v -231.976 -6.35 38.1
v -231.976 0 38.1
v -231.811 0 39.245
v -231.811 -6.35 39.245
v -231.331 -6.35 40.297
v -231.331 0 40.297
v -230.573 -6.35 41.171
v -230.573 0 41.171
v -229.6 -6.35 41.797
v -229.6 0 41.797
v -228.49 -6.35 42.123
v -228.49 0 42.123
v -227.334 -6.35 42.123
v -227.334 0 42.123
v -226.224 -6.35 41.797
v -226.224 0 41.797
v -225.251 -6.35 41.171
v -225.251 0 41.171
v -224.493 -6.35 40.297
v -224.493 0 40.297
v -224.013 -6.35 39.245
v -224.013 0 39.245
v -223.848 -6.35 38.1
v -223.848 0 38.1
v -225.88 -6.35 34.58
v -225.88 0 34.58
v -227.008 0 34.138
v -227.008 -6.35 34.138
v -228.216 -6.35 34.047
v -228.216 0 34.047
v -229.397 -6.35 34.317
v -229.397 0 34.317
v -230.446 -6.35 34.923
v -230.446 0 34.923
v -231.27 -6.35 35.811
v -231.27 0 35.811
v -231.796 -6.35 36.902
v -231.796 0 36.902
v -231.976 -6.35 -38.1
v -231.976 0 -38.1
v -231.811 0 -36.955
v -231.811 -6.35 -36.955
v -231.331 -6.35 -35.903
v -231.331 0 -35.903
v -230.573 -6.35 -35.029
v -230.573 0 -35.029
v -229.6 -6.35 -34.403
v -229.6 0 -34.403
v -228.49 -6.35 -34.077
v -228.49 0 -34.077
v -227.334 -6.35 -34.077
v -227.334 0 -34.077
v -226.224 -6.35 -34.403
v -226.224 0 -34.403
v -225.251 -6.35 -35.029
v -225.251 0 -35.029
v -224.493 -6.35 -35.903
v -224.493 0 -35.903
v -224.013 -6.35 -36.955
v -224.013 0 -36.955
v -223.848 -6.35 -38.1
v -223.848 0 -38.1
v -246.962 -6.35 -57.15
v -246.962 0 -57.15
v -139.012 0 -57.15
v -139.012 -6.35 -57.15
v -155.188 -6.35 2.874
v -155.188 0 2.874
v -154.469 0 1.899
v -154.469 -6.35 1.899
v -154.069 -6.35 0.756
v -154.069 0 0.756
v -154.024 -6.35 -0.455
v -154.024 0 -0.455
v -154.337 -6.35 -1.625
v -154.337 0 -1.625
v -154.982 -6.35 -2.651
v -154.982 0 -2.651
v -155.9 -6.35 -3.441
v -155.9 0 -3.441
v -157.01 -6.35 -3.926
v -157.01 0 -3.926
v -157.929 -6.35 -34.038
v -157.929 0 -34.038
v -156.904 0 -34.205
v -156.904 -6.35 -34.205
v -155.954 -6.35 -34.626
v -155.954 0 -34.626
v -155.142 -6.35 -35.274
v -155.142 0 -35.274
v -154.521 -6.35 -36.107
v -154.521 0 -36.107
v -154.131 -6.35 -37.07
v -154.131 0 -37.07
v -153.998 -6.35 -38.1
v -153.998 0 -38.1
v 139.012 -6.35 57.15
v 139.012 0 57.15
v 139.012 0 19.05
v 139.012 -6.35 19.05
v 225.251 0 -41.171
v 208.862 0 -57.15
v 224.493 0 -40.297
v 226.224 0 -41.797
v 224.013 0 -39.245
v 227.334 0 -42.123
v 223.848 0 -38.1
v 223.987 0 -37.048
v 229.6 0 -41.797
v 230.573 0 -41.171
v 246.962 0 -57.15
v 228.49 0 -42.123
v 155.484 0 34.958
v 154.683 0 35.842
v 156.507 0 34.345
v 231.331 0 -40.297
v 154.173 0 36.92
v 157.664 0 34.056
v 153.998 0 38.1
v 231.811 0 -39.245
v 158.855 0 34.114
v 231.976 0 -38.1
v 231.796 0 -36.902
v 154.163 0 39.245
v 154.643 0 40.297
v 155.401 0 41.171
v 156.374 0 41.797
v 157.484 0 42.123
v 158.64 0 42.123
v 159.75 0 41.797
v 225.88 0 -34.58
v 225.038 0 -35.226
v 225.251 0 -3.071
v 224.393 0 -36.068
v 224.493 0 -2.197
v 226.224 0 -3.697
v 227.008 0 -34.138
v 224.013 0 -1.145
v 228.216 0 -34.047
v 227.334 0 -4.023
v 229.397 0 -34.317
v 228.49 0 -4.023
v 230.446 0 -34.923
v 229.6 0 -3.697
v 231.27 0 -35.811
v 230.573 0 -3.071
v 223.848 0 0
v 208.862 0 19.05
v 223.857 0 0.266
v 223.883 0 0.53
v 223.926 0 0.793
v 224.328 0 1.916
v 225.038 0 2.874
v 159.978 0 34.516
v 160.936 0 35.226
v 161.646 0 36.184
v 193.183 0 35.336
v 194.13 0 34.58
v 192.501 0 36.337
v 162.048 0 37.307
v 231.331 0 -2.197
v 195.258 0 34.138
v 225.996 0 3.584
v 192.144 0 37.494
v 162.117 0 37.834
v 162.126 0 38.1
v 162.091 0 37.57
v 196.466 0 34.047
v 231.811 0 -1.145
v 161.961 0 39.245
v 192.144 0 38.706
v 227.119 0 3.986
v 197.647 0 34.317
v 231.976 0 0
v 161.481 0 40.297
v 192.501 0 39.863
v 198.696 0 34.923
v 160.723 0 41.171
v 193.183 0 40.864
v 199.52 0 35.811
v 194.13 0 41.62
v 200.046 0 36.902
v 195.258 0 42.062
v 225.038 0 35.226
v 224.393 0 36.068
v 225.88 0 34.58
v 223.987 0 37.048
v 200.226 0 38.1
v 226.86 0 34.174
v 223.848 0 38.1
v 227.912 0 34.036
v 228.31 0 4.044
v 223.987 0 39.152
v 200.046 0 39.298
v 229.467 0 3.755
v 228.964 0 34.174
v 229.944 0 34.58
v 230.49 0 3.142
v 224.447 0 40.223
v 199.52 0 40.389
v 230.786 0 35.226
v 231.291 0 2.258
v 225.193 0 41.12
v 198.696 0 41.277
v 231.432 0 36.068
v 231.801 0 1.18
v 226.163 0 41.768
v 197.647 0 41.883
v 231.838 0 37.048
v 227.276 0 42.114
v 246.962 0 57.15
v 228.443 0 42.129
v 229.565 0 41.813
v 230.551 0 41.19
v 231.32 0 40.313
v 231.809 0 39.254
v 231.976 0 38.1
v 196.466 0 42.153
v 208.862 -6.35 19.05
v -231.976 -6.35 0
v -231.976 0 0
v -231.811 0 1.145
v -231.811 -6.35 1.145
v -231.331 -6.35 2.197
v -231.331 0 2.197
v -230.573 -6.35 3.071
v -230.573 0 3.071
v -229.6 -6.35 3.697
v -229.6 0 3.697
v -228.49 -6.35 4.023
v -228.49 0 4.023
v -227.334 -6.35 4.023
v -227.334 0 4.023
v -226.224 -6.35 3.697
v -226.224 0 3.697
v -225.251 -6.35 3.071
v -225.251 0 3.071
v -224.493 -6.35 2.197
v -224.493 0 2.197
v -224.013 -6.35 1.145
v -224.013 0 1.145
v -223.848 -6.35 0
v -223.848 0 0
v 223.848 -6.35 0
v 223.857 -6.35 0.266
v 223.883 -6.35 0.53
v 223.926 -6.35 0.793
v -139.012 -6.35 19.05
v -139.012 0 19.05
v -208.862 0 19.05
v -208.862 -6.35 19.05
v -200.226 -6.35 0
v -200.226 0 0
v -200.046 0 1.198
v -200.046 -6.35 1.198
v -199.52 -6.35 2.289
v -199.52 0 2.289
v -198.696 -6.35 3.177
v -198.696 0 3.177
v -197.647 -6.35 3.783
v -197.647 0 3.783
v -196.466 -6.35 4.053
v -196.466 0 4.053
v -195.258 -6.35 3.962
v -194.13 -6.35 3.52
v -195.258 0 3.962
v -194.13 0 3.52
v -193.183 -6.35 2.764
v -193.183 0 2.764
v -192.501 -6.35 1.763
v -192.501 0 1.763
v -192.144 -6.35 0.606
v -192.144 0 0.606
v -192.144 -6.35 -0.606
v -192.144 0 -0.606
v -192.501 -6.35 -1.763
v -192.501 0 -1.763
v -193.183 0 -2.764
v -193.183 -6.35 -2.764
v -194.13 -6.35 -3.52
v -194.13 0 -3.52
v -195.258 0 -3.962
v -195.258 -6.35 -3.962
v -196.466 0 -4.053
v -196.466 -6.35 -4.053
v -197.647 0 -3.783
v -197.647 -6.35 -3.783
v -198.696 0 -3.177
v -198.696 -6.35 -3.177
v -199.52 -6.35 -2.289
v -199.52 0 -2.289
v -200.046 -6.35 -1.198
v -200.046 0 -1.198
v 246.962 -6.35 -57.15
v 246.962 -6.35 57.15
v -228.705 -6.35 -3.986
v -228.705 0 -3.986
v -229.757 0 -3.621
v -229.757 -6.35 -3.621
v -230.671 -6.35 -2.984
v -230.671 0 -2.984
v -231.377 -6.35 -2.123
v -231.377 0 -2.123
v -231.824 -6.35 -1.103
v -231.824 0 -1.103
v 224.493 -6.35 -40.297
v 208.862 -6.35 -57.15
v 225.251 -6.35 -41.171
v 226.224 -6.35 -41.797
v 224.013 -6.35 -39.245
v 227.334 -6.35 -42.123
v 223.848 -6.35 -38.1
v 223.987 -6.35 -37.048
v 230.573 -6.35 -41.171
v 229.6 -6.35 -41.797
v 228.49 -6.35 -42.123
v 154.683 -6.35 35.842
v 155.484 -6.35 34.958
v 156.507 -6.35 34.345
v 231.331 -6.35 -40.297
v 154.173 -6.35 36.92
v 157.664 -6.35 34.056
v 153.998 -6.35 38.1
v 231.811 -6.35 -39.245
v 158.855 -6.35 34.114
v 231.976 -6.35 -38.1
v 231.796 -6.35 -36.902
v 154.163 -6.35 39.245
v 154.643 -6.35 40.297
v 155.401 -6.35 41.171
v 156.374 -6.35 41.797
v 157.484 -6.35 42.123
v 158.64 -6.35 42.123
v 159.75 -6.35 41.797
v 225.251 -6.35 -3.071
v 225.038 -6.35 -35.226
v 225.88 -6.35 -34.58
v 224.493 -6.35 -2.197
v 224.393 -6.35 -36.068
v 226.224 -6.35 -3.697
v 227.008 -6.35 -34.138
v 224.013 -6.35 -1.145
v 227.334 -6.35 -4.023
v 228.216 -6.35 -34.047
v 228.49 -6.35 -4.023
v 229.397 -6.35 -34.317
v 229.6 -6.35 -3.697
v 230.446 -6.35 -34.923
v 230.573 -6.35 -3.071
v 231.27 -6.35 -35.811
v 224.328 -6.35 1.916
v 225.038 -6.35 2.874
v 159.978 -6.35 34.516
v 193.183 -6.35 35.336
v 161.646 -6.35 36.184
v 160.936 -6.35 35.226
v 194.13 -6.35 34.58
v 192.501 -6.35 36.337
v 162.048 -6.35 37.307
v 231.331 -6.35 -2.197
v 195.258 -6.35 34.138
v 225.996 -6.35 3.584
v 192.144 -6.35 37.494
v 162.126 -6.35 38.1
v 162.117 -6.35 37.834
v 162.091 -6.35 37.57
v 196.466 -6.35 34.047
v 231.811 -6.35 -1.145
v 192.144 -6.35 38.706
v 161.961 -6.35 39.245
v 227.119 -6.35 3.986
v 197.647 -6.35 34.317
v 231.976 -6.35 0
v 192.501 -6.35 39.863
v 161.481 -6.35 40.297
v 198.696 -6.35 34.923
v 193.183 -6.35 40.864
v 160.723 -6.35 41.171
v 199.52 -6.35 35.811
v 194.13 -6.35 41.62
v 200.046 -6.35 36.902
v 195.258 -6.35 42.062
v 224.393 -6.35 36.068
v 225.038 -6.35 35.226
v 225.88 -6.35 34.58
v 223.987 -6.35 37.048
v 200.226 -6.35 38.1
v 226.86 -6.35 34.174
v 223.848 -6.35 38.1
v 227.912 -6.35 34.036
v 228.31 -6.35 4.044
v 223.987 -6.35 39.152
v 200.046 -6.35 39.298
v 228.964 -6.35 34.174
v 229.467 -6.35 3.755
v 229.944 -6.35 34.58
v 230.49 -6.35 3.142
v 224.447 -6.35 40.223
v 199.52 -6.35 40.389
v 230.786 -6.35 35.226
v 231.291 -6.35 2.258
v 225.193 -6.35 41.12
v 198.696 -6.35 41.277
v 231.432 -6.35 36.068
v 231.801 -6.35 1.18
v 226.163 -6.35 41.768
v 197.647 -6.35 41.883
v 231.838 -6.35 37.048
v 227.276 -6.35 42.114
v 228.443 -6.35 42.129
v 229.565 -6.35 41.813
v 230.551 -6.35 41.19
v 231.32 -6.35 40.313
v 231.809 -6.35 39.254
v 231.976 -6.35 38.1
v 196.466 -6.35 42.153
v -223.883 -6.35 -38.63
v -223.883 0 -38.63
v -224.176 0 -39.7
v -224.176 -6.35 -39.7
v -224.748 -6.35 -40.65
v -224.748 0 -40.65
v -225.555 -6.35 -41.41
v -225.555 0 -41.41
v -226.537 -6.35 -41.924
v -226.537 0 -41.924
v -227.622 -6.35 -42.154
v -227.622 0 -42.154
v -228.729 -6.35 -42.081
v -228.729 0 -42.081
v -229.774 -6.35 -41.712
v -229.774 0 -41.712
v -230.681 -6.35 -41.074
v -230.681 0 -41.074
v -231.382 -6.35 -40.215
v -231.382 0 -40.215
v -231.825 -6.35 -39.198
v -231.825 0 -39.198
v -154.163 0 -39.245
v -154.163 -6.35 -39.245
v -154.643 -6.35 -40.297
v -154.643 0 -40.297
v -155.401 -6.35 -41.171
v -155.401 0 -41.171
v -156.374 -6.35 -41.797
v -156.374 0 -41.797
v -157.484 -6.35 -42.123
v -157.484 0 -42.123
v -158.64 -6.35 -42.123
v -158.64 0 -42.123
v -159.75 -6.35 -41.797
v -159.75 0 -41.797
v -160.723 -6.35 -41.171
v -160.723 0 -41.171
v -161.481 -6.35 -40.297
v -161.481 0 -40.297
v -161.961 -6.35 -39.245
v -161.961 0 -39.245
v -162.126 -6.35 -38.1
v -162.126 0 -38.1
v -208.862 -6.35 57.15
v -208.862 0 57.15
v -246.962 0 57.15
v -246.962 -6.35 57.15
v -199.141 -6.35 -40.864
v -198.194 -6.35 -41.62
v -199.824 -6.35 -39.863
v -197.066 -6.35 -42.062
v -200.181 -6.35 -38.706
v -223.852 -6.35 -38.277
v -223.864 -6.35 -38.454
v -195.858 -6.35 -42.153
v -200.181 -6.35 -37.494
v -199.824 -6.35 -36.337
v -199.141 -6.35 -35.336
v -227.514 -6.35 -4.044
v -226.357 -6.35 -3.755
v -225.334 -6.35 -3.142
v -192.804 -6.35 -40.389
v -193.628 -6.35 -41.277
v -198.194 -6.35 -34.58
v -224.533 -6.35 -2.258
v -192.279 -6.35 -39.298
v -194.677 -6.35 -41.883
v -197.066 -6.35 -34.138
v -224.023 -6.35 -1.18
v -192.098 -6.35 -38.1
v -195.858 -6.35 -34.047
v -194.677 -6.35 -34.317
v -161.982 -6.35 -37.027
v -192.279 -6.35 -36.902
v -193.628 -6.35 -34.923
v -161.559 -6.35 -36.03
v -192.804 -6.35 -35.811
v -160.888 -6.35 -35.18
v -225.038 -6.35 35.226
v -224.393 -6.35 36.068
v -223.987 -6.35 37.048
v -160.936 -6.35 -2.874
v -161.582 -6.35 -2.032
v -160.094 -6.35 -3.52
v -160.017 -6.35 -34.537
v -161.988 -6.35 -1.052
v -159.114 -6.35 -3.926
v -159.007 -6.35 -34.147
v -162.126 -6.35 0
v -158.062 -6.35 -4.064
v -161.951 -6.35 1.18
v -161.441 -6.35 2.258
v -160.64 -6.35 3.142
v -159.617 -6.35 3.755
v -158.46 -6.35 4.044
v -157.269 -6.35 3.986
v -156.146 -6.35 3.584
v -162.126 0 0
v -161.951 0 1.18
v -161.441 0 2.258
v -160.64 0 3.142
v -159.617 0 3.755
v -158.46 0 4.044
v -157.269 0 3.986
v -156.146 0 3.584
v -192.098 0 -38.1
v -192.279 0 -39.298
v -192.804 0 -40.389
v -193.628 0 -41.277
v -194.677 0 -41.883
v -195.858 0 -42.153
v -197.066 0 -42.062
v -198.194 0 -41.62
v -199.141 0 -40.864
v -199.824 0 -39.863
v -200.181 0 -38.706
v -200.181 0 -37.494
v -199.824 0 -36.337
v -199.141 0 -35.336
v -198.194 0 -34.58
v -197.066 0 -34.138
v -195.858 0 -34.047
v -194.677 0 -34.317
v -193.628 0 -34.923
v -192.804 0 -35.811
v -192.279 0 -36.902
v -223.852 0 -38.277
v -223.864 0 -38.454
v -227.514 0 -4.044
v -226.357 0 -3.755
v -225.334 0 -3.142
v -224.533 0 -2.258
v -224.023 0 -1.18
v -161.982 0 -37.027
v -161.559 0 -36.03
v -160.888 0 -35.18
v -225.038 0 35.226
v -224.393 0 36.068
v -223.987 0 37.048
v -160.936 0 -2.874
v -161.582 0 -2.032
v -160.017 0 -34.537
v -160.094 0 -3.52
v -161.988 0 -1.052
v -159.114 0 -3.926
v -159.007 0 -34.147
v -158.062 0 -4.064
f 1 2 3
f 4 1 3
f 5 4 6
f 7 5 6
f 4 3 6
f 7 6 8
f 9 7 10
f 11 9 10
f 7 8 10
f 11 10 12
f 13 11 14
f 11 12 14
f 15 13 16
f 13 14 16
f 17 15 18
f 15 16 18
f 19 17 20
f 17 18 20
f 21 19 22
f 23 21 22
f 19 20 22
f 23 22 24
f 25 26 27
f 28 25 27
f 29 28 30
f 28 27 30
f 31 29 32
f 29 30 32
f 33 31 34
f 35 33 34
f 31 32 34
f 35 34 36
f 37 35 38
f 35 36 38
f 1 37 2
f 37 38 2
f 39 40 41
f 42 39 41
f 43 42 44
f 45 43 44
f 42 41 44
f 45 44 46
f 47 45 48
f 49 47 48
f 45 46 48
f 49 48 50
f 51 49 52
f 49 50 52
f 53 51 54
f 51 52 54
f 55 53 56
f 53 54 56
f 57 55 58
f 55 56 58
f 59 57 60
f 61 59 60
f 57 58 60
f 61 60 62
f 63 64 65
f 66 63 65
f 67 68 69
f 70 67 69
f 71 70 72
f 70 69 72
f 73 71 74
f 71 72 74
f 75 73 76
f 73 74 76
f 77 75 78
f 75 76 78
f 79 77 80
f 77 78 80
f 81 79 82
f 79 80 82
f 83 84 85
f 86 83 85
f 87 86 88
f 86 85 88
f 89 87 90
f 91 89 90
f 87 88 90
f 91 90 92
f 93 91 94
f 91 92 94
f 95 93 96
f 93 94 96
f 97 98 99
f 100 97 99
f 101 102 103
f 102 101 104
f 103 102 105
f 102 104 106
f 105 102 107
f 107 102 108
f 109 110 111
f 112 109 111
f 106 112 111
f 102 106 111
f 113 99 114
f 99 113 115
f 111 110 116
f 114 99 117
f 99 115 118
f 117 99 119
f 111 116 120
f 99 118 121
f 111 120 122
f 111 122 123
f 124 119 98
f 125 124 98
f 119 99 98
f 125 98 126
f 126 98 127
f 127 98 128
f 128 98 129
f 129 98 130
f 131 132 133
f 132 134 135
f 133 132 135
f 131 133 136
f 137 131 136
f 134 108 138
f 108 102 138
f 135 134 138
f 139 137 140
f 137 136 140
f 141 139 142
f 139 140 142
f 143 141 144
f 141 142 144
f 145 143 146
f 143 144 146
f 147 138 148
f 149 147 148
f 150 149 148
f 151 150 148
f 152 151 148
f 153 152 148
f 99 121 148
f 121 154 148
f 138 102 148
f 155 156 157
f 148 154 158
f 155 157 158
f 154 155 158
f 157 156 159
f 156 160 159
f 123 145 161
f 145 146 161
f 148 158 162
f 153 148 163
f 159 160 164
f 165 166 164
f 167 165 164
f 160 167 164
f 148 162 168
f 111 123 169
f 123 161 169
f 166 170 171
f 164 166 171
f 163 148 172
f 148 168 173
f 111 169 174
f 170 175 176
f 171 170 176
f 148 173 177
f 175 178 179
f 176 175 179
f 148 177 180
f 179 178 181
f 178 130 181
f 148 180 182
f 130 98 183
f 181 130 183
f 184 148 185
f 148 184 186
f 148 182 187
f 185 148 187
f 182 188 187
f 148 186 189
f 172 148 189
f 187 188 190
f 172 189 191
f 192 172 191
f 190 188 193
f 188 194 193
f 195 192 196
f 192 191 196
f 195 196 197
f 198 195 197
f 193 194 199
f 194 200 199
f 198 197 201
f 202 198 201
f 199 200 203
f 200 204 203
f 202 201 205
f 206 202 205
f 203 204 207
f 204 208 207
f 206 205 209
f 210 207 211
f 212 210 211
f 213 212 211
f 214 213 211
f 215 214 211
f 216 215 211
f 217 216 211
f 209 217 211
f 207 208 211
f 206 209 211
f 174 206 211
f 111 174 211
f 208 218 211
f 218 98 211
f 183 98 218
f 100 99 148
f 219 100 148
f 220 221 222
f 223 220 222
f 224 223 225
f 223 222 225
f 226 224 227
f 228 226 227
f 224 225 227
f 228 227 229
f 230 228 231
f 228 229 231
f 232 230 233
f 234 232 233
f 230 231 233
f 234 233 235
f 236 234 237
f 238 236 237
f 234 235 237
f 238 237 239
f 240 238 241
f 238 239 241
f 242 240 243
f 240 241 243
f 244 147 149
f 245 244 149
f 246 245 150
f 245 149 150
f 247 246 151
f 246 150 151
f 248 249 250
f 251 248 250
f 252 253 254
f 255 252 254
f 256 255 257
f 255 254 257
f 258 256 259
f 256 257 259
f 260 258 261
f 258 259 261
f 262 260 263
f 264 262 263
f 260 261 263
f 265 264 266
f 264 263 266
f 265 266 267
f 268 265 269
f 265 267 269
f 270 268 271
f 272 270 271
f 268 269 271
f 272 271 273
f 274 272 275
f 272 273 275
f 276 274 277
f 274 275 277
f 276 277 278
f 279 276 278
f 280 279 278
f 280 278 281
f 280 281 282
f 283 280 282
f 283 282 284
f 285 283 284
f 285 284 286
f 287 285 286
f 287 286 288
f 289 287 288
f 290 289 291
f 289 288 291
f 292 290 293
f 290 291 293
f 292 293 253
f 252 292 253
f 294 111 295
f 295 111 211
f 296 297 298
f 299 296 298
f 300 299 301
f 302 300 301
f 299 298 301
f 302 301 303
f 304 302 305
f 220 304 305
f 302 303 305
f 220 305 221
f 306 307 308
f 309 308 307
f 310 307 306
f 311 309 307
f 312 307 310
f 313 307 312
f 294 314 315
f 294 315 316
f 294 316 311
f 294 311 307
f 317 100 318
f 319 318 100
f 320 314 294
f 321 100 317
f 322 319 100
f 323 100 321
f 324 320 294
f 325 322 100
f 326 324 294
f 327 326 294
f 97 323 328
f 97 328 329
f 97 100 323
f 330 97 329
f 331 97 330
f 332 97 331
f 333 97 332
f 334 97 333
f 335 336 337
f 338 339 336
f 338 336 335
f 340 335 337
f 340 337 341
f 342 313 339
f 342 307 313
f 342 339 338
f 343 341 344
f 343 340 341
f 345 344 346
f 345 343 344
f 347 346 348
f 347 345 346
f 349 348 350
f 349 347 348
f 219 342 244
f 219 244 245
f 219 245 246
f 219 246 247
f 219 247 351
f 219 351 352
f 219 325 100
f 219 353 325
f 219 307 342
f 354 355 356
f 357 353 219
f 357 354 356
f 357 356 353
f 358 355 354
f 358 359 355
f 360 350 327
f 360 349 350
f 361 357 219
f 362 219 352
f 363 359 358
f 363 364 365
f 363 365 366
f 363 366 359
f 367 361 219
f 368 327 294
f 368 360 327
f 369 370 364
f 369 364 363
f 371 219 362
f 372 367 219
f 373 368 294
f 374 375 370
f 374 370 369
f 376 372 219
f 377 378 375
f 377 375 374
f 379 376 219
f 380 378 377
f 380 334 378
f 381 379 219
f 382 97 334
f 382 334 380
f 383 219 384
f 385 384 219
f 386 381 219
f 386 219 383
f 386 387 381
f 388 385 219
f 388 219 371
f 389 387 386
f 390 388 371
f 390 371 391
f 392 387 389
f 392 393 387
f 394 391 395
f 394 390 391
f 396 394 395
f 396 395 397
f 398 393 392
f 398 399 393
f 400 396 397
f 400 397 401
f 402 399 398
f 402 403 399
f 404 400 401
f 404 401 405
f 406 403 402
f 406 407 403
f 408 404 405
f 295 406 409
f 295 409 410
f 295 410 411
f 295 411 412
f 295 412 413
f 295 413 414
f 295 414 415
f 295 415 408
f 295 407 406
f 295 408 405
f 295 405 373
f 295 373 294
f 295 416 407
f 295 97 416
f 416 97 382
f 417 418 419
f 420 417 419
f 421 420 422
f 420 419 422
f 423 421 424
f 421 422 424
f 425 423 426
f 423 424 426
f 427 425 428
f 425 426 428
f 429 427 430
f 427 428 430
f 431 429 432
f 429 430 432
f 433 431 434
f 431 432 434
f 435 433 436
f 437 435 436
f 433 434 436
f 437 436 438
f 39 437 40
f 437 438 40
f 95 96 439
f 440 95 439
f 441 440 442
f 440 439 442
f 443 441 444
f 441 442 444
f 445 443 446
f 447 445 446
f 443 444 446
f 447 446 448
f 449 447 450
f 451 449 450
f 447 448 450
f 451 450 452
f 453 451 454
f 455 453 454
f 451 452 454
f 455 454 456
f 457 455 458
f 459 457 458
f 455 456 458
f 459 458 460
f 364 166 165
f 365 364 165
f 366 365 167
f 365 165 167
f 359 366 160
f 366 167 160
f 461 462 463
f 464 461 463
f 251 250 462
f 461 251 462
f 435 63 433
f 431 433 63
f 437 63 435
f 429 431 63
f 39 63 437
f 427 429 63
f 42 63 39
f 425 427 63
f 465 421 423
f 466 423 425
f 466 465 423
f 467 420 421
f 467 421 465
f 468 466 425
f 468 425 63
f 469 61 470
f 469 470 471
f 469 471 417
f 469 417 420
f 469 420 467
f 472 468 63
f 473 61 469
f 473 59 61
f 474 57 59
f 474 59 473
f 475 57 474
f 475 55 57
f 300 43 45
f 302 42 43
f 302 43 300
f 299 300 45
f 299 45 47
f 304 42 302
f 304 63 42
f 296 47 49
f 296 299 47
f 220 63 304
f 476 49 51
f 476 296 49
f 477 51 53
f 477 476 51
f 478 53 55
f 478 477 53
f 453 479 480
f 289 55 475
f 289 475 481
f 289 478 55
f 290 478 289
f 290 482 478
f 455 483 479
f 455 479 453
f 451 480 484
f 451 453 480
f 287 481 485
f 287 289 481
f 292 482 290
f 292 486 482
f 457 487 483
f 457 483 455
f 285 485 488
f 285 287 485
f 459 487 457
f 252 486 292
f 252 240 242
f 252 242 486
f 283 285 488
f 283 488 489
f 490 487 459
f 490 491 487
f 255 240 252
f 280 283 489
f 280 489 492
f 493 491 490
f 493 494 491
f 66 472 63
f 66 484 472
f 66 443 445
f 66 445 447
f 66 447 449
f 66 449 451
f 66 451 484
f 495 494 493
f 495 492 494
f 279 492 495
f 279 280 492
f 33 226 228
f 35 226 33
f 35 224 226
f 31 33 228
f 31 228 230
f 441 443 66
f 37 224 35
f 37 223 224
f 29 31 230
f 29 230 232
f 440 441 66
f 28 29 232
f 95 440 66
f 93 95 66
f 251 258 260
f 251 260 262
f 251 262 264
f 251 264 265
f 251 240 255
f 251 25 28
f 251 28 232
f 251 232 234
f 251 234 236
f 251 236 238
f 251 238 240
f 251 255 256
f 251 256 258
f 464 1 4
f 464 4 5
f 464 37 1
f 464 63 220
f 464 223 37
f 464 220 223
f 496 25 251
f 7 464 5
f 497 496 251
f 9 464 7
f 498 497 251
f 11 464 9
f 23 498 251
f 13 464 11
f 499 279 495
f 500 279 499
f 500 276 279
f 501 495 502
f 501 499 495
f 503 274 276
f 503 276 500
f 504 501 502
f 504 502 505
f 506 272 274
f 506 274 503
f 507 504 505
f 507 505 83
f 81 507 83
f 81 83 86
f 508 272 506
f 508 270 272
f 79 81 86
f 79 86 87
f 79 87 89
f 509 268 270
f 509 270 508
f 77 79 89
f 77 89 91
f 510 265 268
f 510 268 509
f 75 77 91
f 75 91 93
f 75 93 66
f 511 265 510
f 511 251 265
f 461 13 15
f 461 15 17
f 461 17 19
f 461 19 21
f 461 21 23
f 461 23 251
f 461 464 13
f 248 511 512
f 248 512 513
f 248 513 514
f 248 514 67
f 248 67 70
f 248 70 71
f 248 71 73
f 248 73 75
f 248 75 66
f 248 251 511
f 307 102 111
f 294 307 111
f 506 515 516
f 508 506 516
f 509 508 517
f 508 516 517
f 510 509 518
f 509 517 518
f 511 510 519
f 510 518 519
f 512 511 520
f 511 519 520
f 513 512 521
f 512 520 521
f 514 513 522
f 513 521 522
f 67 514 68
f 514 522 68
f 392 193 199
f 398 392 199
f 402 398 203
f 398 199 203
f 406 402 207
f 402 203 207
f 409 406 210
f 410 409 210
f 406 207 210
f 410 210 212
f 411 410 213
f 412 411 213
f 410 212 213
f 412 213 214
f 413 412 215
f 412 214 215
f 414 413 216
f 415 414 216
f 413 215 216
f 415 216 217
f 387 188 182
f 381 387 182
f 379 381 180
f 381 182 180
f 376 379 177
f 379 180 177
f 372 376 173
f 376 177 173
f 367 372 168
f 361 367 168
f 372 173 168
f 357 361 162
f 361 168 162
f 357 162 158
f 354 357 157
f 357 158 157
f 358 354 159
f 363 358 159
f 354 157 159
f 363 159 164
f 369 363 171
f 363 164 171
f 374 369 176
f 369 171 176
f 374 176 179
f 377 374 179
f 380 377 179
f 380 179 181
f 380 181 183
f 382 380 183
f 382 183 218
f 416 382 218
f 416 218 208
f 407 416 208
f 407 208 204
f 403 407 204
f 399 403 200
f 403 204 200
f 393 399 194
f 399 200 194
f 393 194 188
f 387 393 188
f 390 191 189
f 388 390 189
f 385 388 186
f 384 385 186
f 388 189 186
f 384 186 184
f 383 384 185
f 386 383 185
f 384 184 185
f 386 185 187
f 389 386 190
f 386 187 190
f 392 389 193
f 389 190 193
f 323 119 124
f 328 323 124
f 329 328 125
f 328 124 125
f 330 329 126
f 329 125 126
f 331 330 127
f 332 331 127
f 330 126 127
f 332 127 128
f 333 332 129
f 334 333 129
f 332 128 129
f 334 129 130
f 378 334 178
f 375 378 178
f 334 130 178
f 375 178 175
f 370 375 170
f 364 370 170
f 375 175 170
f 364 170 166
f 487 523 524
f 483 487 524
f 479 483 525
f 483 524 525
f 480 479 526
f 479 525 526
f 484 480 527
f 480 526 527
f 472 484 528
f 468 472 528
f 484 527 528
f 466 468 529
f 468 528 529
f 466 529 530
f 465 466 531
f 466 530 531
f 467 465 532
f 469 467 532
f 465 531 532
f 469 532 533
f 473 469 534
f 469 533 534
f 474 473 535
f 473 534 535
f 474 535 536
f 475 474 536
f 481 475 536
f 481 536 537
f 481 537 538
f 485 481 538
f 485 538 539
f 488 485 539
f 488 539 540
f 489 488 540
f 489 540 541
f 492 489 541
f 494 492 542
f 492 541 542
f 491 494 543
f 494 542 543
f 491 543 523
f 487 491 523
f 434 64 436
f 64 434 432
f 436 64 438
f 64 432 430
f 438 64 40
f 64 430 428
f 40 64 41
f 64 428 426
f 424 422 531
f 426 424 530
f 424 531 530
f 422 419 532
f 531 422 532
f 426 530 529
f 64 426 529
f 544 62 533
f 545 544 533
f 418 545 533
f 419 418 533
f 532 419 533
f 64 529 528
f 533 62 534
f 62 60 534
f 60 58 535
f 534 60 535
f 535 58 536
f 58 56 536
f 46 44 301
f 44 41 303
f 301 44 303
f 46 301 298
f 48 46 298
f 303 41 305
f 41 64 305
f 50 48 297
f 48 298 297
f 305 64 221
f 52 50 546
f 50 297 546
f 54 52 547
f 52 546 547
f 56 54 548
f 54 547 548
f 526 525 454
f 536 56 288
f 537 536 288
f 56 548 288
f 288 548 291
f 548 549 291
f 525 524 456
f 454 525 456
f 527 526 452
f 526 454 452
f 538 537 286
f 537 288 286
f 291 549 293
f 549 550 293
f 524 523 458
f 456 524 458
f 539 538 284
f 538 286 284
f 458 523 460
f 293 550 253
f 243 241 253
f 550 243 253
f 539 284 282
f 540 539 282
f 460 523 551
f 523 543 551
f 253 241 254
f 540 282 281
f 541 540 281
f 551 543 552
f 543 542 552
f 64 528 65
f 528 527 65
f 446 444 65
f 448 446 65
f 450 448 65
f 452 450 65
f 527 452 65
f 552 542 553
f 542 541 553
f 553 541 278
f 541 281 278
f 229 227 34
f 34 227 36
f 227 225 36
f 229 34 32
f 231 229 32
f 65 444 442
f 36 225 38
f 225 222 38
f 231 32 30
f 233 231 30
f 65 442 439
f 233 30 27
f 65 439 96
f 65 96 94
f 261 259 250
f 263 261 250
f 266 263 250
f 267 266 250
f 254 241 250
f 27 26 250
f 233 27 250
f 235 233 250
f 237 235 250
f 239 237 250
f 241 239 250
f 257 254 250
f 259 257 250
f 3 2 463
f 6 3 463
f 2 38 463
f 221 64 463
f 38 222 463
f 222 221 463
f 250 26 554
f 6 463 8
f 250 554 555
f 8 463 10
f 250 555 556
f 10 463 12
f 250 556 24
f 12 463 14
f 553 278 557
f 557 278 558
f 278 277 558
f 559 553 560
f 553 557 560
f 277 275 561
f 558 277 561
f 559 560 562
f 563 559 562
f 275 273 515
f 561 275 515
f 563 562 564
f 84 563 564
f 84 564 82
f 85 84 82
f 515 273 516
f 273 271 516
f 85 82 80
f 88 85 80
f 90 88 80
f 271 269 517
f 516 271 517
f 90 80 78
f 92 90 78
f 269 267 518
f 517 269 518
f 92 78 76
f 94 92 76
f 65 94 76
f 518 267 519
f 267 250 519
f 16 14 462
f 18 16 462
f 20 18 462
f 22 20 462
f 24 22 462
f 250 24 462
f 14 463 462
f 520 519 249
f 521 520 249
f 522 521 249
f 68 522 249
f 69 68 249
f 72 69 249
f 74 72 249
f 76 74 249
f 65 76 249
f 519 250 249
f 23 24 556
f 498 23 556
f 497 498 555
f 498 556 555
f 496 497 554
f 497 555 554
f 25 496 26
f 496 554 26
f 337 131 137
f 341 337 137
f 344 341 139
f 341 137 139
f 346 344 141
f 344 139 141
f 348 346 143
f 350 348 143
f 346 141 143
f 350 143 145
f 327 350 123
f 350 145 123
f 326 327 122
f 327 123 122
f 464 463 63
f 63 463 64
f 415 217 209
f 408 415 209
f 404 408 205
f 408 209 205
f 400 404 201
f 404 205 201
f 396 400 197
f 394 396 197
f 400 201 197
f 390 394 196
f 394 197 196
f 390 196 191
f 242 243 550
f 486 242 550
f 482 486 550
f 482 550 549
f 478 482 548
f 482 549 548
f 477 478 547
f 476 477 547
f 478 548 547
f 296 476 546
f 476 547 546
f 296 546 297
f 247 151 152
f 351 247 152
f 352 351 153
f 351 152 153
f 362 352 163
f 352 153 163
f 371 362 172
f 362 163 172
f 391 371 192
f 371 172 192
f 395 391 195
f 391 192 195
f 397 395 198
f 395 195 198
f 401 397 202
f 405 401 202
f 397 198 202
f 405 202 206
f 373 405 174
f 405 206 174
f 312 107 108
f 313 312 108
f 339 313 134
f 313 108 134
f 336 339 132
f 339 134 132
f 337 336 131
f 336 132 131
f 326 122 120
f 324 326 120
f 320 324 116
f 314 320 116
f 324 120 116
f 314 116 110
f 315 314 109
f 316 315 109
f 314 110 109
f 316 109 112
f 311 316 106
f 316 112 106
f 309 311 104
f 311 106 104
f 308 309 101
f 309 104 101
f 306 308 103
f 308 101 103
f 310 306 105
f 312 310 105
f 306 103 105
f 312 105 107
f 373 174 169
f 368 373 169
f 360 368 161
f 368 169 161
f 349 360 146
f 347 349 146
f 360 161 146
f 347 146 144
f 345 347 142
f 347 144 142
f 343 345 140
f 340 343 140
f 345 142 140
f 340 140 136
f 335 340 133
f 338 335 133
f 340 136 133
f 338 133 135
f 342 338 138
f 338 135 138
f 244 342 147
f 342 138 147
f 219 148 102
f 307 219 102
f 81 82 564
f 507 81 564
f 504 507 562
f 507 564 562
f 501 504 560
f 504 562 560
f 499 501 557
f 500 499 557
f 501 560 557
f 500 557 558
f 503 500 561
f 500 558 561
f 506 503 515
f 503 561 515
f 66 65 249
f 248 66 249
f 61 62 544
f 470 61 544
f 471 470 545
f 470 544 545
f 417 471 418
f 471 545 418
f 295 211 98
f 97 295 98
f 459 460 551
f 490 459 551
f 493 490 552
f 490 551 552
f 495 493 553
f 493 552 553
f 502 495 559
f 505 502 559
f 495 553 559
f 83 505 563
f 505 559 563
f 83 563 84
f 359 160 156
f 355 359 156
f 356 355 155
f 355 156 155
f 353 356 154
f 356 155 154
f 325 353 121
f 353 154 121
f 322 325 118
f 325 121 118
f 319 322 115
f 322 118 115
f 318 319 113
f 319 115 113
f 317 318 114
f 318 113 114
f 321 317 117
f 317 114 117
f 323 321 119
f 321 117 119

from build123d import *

# Parameters (mm, degrees)
F1_DEPTH = 6.35


with BuildPart() as f1:
    # F0 (on Front) → F1 (new body)
    with BuildSketch(Plane.XZ):
        Polygon((-246.962117, -57.15), (-139.012117, -57.15), (-139.012117, 19.05), (-208.862117, 19.05), (-208.862117, 57.15), (-246.962117, 57.15), align=None)
        with BuildLine():
            ThreePointArc((-223.848117, -38.1), (-223.856818, -38.365795), (-223.882884, -38.630451))
            ThreePointArc((-223.882884, -38.630451), (-228.177912, -42.155299), (-231.976117, -38.1))
            ThreePointArc((-231.976117, -38.1), (-227.912117, -34.036), (-223.848117, -38.1))
        make_face(mode=Mode.SUBTRACT)
        with BuildLine():
            ThreePointArc((-200.226117, -38.1), (-196.162117, -34.036), (-192.098117, -38.1))
            ThreePointArc((-192.098117, -38.1), (-196.162117, -42.164), (-200.226117, -38.1))
        make_face(mode=Mode.SUBTRACT)
        with BuildLine():
            ThreePointArc((-162.126117, -38.1), (-160.888387, -35.179676), (-157.929123, -34.038177))
            ThreePointArc((-157.929123, -34.038177), (-155.141793, -35.27373), (-153.998117, -38.1))
            ThreePointArc((-153.998117, -38.1), (-158.062117, -42.164), (-162.126117, -38.1))
        make_face(mode=Mode.SUBTRACT)
        with BuildLine():
            ThreePointArc((-155.188423, 2.873669), (-154.136594, -1.051838), (-157.010253, -3.925516))
            ThreePointArc((-157.010253, -3.925516), (-160.536114, -3.224195), (-162.126117, 0))
            ThreePointArc((-162.126117, 0), (-159.617334, 3.75465), (-155.188423, 2.873669))
        make_face(mode=Mode.SUBTRACT)
        with BuildLine():
            ThreePointArc((-223.848117, 0), (-225.333938, -3.14151), (-228.704952, -3.985914))
            ThreePointArc((-228.704952, -3.985914), (-231.053628, -2.578179), (-231.976117, 0))
            ThreePointArc((-231.976117, 0), (-227.912117, 4.064), (-223.848117, 0))
        make_face(mode=Mode.SUBTRACT)
        with BuildLine():
            ThreePointArc((-192.098117, 0), (-196.162117, -4.064), (-200.226117, 0))
            ThreePointArc((-200.226117, 0), (-196.162117, 4.064), (-192.098117, 0))
        make_face(mode=Mode.SUBTRACT)
        with BuildLine():
            ThreePointArc((-223.848117, 38.1), (-224.39259, 36.068), (-225.880116, 34.580473))
            ThreePointArc((-225.880116, 34.580473), (-229.944117, 34.580473), (-231.976117, 38.1))
            ThreePointArc((-231.976117, 38.1), (-227.912117, 42.164), (-223.848117, 38.1))
        make_face(mode=Mode.SUBTRACT)
        Polygon((246.962117, 57.15), (139.012117, 57.15), (139.012117, 19.05), (208.862117, 19.05), (208.862117, -57.15), (246.962117, -57.15), align=None)
        with BuildLine():
            ThreePointArc((223.848117, -38.1), (224.39259, -36.068), (225.880116, -34.580473))
            ThreePointArc((225.880116, -34.580473), (229.944117, -34.580473), (231.976117, -38.1))
            ThreePointArc((231.976117, -38.1), (227.912117, -42.164), (223.848117, -38.1))
        make_face(mode=Mode.SUBTRACT)
        with BuildLine():
            ThreePointArc((223.848117, 0), (223.867686, 0.398335), (223.926203, 0.792834))
            ThreePointArc((223.926203, 0.792834), (228.310452, 4.044431), (231.976117, 0))
            ThreePointArc((231.976117, 0), (227.912117, -4.064), (223.848117, 0))
        make_face(mode=Mode.SUBTRACT)
        with BuildLine():
            ThreePointArc((162.126117, 38.1), (162.106548, 37.701662), (162.04803, 37.307161))
            ThreePointArc((162.04803, 37.307161), (157.66378, 34.055569), (153.998117, 38.1))
            ThreePointArc((153.998117, 38.1), (158.062117, 42.164), (162.126117, 38.1))
        make_face(mode=Mode.SUBTRACT)
        with BuildLine():
            ThreePointArc((192.098117, 38.1), (196.162117, 42.164), (200.226117, 38.1))
            ThreePointArc((200.226117, 38.1), (196.162117, 34.036), (192.098117, 38.1))
        make_face(mode=Mode.SUBTRACT)
        with BuildLine():
            ThreePointArc((231.976117, 38.1), (230.785799, 35.226318), (227.912117, 34.036))
            ThreePointArc((227.912117, 34.036), (224.687931, 35.625991), (223.986593, 39.151834))
            ThreePointArc((223.986593, 39.151834), (228.442572, 42.129232), (231.976117, 38.1))
        make_face(mode=Mode.SUBTRACT)
    extrude(amount=F1_DEPTH)


solid = f1.part
